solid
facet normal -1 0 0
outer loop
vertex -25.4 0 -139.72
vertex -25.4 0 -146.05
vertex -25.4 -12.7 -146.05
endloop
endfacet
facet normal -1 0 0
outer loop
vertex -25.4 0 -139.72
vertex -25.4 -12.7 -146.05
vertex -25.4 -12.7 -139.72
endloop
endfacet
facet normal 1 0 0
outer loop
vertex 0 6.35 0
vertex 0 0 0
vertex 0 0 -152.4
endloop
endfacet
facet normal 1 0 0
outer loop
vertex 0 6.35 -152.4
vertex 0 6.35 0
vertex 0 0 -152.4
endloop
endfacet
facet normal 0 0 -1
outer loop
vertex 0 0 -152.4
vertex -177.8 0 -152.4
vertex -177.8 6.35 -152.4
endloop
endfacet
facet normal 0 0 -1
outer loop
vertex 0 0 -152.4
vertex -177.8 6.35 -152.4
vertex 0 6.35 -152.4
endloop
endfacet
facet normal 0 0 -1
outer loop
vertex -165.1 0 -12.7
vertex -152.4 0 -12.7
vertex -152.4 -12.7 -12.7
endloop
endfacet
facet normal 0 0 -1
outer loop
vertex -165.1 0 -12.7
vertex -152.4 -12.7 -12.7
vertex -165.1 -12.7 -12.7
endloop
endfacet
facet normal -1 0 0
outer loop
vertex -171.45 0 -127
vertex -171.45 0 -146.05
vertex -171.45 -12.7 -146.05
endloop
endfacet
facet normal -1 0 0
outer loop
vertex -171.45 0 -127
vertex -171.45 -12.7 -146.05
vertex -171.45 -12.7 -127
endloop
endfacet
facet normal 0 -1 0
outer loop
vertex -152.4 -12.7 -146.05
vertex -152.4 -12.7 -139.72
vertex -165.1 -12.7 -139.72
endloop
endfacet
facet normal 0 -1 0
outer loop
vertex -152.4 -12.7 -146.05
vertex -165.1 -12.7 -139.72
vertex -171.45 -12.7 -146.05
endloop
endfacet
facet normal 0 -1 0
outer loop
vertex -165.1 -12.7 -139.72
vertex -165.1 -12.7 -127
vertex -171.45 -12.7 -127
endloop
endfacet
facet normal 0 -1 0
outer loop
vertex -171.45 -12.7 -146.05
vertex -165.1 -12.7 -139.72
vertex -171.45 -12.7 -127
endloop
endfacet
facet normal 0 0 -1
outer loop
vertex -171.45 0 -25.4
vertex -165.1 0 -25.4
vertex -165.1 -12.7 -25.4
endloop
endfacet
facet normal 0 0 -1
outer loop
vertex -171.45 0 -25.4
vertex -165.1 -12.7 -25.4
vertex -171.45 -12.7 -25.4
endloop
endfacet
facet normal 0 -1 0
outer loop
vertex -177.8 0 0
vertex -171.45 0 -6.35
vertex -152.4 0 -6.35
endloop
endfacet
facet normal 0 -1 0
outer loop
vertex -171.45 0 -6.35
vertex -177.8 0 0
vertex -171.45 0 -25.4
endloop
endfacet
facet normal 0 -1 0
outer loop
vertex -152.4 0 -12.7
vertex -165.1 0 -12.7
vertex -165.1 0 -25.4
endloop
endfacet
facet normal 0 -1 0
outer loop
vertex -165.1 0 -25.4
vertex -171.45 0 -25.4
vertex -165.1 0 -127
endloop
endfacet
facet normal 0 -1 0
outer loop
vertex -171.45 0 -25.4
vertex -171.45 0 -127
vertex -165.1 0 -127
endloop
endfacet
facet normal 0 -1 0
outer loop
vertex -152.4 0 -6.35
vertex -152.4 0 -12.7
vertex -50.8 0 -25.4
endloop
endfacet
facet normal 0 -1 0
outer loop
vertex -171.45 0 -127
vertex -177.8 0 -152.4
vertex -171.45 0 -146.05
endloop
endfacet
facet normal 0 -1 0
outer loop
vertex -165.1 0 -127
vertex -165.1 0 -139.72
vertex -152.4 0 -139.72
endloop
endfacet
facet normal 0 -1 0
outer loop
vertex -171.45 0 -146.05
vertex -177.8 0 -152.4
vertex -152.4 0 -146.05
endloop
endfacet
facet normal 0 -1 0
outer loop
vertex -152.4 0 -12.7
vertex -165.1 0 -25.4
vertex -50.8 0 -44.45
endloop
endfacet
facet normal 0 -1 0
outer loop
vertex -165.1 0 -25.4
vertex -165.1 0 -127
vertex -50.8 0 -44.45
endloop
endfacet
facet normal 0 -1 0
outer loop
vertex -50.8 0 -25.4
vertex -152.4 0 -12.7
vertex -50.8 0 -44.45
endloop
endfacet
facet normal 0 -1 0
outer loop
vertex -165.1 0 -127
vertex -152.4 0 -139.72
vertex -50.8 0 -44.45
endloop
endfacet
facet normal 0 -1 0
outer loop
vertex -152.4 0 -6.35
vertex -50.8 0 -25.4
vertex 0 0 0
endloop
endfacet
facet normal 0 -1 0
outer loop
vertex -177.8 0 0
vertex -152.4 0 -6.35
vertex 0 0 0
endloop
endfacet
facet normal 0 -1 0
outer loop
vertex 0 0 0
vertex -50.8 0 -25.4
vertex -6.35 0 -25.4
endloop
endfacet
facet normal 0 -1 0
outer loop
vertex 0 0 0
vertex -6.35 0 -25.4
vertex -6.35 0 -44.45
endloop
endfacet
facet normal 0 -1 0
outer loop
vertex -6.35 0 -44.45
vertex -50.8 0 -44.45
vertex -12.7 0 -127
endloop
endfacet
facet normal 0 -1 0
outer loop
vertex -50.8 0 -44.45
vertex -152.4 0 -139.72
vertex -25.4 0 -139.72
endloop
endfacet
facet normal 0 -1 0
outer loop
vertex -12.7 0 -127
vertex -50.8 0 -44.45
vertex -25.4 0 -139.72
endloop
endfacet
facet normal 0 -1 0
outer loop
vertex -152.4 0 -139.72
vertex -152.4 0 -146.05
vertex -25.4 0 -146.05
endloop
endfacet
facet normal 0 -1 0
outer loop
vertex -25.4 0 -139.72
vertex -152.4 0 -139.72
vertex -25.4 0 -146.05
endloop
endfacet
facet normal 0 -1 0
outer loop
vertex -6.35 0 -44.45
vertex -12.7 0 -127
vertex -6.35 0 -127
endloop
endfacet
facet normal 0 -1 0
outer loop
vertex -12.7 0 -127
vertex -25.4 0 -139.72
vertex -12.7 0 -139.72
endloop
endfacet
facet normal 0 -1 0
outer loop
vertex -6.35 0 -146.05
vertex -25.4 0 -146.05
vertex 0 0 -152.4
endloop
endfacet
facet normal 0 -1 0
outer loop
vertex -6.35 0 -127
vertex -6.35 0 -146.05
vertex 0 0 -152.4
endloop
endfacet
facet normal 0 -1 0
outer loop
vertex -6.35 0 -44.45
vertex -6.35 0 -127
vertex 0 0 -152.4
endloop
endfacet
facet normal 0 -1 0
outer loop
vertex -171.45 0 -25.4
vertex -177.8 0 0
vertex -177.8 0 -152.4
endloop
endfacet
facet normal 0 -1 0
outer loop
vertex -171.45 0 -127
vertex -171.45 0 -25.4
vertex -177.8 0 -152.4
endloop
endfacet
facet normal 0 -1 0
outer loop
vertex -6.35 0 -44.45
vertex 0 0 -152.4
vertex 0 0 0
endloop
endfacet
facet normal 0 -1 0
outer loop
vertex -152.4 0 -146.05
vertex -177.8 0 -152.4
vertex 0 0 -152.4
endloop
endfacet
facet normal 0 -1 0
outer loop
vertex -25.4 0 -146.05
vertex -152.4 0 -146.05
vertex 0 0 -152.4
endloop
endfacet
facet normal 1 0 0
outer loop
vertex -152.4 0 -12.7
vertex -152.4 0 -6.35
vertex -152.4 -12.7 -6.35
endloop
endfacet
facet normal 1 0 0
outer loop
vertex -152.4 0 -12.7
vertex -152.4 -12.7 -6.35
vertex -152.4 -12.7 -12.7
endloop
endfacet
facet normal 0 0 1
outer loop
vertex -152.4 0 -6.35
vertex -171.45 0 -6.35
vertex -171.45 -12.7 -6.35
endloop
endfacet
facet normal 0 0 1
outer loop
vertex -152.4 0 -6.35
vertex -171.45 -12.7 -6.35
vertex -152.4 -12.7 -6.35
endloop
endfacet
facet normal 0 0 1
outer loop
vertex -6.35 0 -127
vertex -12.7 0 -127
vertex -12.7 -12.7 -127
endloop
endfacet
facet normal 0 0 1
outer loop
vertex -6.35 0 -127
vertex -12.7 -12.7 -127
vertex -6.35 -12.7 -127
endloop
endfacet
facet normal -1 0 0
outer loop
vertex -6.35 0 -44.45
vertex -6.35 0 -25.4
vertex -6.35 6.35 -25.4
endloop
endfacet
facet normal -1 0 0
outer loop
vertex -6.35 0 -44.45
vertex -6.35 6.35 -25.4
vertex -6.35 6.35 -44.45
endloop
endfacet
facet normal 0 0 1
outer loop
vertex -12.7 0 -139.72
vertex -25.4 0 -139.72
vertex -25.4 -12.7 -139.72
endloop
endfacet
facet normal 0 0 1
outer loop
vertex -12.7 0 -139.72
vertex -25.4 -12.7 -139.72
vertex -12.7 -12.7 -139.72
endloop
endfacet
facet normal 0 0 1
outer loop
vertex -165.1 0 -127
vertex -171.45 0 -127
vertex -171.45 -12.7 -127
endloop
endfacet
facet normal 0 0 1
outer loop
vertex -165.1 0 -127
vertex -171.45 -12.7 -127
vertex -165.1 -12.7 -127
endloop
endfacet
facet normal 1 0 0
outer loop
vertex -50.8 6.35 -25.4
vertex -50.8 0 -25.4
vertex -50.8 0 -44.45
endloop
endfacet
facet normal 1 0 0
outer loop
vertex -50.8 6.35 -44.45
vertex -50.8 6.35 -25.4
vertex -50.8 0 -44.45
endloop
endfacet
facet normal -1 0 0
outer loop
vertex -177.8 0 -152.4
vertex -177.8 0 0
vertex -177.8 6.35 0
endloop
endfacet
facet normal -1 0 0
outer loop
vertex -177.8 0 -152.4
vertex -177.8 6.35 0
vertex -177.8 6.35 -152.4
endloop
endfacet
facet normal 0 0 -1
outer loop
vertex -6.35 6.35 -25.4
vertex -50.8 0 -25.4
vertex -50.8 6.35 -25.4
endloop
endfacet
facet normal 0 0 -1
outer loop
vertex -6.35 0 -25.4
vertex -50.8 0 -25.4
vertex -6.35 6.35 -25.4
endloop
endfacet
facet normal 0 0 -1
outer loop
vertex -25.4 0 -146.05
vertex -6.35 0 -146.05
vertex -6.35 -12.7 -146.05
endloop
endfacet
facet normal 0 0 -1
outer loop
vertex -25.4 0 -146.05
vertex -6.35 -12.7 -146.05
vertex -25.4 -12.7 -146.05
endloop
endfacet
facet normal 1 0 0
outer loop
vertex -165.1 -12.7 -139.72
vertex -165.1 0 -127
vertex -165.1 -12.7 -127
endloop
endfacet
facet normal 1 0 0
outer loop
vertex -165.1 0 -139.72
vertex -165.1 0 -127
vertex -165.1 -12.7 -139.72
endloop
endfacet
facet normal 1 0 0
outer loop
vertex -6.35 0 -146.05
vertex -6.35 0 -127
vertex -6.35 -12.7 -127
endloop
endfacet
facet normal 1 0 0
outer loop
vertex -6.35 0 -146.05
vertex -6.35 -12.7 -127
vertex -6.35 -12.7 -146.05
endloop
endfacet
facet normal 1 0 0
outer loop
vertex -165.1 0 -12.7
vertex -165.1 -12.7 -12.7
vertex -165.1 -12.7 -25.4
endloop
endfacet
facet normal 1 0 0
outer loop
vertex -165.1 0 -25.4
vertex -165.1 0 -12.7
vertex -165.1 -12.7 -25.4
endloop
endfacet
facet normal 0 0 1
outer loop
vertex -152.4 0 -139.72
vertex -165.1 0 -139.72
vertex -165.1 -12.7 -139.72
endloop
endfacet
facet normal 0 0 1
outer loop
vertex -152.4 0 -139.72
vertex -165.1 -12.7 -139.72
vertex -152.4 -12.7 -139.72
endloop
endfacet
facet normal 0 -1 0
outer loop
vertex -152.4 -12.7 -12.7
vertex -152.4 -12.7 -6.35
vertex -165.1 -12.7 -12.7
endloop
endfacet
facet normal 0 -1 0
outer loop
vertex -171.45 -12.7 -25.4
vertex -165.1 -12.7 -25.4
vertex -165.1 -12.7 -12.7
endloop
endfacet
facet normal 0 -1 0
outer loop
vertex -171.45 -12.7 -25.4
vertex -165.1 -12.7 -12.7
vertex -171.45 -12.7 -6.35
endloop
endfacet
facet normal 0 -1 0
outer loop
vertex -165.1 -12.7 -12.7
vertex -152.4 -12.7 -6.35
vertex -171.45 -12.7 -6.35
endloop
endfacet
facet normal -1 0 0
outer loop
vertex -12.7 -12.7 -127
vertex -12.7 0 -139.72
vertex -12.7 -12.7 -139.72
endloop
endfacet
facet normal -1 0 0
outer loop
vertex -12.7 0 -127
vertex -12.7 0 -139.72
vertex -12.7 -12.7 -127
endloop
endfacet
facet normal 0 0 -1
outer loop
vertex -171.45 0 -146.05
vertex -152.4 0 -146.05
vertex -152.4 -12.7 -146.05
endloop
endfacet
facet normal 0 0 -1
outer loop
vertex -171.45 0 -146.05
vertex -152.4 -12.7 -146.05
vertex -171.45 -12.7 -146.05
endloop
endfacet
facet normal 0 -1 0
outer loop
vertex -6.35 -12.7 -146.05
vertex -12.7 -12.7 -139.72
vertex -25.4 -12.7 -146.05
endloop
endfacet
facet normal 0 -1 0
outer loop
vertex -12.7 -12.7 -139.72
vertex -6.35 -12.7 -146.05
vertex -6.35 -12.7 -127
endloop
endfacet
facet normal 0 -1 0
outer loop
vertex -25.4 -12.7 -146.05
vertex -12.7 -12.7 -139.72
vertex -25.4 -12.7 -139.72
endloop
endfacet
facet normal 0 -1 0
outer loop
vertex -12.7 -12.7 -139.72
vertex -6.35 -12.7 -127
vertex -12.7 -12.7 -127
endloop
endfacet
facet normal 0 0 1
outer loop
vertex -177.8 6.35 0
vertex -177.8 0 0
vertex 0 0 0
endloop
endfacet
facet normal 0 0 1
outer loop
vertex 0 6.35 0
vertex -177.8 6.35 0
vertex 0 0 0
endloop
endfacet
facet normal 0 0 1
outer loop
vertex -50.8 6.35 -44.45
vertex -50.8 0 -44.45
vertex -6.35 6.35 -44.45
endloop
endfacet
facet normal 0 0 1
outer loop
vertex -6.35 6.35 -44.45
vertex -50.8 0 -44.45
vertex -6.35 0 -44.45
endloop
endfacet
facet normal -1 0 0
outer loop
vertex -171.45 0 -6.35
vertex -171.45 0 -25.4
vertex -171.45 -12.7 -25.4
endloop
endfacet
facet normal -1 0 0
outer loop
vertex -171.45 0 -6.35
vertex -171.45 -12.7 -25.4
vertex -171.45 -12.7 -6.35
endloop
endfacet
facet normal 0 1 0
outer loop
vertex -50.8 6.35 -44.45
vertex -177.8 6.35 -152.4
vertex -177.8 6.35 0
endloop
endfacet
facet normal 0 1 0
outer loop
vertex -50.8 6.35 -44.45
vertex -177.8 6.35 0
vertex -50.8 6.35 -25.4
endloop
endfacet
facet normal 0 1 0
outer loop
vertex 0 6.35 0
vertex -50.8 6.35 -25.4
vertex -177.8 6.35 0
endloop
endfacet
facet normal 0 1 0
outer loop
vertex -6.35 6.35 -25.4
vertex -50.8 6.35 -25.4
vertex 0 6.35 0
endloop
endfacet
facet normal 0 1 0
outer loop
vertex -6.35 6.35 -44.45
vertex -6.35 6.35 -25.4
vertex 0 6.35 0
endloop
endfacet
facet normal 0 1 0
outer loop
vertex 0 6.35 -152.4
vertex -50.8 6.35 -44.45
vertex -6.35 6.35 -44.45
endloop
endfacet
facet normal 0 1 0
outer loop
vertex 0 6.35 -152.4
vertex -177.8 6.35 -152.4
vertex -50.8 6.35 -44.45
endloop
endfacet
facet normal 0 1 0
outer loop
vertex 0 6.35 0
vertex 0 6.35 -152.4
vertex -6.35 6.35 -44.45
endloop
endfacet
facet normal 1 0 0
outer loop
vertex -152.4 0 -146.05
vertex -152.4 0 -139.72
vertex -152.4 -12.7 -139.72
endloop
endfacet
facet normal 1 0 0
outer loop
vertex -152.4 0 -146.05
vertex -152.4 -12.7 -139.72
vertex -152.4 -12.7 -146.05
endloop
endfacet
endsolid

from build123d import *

# Parameters (mm, degrees)
SKETCH1_W           = 177.8
SKETCH1_H           = 152.4
SKETCH1_W_2         = 44.45
SKETCH1_H_2         = 19.05
BOSS_EXTRUDE1_DEPTH = 6.35
BOSS_EXTRUDE2_DEPTH = 12.7


with BuildPart() as part:
    # Sketch1 → Boss-Extrude1 (new body)
    with BuildSketch(Plane(origin=(0, 0, 0), x_dir=(1, 0, 0), z_dir=(0, 1, 0))):
        with Locations((-88.9, 76.2)):
            Rectangle(SKETCH1_W, SKETCH1_H)
        with Locations((-28.575, 34.925)):
            Rectangle(SKETCH1_W_2, SKETCH1_H_2, mode=Mode.SUBTRACT)
    extrude(amount=BOSS_EXTRUDE1_DEPTH)

    # Sketch2 → Boss-Extrude2 (add)
    with BuildSketch(Plane.XZ):
        Polygon((-171.45, -146.05), (-171.45, -127), (-165.1, -127), (-165.1, -139.720102982), (-152.4, -139.720102982), (-152.4, -146.05), align=None)
        Polygon((-6.35, -146.05), (-25.4, -146.05), (-25.4, -139.720102982), (-12.7, -139.720102982), (-12.7, -127), (-6.35, -127), align=None)
        Polygon((-171.45, -6.35), (-152.4, -6.35), (-152.4, -12.7), (-165.1, -12.7), (-165.1, -25.4), (-171.45, -25.4), align=None)
    extrude(amount=BOSS_EXTRUDE2_DEPTH)


solid = part.part
